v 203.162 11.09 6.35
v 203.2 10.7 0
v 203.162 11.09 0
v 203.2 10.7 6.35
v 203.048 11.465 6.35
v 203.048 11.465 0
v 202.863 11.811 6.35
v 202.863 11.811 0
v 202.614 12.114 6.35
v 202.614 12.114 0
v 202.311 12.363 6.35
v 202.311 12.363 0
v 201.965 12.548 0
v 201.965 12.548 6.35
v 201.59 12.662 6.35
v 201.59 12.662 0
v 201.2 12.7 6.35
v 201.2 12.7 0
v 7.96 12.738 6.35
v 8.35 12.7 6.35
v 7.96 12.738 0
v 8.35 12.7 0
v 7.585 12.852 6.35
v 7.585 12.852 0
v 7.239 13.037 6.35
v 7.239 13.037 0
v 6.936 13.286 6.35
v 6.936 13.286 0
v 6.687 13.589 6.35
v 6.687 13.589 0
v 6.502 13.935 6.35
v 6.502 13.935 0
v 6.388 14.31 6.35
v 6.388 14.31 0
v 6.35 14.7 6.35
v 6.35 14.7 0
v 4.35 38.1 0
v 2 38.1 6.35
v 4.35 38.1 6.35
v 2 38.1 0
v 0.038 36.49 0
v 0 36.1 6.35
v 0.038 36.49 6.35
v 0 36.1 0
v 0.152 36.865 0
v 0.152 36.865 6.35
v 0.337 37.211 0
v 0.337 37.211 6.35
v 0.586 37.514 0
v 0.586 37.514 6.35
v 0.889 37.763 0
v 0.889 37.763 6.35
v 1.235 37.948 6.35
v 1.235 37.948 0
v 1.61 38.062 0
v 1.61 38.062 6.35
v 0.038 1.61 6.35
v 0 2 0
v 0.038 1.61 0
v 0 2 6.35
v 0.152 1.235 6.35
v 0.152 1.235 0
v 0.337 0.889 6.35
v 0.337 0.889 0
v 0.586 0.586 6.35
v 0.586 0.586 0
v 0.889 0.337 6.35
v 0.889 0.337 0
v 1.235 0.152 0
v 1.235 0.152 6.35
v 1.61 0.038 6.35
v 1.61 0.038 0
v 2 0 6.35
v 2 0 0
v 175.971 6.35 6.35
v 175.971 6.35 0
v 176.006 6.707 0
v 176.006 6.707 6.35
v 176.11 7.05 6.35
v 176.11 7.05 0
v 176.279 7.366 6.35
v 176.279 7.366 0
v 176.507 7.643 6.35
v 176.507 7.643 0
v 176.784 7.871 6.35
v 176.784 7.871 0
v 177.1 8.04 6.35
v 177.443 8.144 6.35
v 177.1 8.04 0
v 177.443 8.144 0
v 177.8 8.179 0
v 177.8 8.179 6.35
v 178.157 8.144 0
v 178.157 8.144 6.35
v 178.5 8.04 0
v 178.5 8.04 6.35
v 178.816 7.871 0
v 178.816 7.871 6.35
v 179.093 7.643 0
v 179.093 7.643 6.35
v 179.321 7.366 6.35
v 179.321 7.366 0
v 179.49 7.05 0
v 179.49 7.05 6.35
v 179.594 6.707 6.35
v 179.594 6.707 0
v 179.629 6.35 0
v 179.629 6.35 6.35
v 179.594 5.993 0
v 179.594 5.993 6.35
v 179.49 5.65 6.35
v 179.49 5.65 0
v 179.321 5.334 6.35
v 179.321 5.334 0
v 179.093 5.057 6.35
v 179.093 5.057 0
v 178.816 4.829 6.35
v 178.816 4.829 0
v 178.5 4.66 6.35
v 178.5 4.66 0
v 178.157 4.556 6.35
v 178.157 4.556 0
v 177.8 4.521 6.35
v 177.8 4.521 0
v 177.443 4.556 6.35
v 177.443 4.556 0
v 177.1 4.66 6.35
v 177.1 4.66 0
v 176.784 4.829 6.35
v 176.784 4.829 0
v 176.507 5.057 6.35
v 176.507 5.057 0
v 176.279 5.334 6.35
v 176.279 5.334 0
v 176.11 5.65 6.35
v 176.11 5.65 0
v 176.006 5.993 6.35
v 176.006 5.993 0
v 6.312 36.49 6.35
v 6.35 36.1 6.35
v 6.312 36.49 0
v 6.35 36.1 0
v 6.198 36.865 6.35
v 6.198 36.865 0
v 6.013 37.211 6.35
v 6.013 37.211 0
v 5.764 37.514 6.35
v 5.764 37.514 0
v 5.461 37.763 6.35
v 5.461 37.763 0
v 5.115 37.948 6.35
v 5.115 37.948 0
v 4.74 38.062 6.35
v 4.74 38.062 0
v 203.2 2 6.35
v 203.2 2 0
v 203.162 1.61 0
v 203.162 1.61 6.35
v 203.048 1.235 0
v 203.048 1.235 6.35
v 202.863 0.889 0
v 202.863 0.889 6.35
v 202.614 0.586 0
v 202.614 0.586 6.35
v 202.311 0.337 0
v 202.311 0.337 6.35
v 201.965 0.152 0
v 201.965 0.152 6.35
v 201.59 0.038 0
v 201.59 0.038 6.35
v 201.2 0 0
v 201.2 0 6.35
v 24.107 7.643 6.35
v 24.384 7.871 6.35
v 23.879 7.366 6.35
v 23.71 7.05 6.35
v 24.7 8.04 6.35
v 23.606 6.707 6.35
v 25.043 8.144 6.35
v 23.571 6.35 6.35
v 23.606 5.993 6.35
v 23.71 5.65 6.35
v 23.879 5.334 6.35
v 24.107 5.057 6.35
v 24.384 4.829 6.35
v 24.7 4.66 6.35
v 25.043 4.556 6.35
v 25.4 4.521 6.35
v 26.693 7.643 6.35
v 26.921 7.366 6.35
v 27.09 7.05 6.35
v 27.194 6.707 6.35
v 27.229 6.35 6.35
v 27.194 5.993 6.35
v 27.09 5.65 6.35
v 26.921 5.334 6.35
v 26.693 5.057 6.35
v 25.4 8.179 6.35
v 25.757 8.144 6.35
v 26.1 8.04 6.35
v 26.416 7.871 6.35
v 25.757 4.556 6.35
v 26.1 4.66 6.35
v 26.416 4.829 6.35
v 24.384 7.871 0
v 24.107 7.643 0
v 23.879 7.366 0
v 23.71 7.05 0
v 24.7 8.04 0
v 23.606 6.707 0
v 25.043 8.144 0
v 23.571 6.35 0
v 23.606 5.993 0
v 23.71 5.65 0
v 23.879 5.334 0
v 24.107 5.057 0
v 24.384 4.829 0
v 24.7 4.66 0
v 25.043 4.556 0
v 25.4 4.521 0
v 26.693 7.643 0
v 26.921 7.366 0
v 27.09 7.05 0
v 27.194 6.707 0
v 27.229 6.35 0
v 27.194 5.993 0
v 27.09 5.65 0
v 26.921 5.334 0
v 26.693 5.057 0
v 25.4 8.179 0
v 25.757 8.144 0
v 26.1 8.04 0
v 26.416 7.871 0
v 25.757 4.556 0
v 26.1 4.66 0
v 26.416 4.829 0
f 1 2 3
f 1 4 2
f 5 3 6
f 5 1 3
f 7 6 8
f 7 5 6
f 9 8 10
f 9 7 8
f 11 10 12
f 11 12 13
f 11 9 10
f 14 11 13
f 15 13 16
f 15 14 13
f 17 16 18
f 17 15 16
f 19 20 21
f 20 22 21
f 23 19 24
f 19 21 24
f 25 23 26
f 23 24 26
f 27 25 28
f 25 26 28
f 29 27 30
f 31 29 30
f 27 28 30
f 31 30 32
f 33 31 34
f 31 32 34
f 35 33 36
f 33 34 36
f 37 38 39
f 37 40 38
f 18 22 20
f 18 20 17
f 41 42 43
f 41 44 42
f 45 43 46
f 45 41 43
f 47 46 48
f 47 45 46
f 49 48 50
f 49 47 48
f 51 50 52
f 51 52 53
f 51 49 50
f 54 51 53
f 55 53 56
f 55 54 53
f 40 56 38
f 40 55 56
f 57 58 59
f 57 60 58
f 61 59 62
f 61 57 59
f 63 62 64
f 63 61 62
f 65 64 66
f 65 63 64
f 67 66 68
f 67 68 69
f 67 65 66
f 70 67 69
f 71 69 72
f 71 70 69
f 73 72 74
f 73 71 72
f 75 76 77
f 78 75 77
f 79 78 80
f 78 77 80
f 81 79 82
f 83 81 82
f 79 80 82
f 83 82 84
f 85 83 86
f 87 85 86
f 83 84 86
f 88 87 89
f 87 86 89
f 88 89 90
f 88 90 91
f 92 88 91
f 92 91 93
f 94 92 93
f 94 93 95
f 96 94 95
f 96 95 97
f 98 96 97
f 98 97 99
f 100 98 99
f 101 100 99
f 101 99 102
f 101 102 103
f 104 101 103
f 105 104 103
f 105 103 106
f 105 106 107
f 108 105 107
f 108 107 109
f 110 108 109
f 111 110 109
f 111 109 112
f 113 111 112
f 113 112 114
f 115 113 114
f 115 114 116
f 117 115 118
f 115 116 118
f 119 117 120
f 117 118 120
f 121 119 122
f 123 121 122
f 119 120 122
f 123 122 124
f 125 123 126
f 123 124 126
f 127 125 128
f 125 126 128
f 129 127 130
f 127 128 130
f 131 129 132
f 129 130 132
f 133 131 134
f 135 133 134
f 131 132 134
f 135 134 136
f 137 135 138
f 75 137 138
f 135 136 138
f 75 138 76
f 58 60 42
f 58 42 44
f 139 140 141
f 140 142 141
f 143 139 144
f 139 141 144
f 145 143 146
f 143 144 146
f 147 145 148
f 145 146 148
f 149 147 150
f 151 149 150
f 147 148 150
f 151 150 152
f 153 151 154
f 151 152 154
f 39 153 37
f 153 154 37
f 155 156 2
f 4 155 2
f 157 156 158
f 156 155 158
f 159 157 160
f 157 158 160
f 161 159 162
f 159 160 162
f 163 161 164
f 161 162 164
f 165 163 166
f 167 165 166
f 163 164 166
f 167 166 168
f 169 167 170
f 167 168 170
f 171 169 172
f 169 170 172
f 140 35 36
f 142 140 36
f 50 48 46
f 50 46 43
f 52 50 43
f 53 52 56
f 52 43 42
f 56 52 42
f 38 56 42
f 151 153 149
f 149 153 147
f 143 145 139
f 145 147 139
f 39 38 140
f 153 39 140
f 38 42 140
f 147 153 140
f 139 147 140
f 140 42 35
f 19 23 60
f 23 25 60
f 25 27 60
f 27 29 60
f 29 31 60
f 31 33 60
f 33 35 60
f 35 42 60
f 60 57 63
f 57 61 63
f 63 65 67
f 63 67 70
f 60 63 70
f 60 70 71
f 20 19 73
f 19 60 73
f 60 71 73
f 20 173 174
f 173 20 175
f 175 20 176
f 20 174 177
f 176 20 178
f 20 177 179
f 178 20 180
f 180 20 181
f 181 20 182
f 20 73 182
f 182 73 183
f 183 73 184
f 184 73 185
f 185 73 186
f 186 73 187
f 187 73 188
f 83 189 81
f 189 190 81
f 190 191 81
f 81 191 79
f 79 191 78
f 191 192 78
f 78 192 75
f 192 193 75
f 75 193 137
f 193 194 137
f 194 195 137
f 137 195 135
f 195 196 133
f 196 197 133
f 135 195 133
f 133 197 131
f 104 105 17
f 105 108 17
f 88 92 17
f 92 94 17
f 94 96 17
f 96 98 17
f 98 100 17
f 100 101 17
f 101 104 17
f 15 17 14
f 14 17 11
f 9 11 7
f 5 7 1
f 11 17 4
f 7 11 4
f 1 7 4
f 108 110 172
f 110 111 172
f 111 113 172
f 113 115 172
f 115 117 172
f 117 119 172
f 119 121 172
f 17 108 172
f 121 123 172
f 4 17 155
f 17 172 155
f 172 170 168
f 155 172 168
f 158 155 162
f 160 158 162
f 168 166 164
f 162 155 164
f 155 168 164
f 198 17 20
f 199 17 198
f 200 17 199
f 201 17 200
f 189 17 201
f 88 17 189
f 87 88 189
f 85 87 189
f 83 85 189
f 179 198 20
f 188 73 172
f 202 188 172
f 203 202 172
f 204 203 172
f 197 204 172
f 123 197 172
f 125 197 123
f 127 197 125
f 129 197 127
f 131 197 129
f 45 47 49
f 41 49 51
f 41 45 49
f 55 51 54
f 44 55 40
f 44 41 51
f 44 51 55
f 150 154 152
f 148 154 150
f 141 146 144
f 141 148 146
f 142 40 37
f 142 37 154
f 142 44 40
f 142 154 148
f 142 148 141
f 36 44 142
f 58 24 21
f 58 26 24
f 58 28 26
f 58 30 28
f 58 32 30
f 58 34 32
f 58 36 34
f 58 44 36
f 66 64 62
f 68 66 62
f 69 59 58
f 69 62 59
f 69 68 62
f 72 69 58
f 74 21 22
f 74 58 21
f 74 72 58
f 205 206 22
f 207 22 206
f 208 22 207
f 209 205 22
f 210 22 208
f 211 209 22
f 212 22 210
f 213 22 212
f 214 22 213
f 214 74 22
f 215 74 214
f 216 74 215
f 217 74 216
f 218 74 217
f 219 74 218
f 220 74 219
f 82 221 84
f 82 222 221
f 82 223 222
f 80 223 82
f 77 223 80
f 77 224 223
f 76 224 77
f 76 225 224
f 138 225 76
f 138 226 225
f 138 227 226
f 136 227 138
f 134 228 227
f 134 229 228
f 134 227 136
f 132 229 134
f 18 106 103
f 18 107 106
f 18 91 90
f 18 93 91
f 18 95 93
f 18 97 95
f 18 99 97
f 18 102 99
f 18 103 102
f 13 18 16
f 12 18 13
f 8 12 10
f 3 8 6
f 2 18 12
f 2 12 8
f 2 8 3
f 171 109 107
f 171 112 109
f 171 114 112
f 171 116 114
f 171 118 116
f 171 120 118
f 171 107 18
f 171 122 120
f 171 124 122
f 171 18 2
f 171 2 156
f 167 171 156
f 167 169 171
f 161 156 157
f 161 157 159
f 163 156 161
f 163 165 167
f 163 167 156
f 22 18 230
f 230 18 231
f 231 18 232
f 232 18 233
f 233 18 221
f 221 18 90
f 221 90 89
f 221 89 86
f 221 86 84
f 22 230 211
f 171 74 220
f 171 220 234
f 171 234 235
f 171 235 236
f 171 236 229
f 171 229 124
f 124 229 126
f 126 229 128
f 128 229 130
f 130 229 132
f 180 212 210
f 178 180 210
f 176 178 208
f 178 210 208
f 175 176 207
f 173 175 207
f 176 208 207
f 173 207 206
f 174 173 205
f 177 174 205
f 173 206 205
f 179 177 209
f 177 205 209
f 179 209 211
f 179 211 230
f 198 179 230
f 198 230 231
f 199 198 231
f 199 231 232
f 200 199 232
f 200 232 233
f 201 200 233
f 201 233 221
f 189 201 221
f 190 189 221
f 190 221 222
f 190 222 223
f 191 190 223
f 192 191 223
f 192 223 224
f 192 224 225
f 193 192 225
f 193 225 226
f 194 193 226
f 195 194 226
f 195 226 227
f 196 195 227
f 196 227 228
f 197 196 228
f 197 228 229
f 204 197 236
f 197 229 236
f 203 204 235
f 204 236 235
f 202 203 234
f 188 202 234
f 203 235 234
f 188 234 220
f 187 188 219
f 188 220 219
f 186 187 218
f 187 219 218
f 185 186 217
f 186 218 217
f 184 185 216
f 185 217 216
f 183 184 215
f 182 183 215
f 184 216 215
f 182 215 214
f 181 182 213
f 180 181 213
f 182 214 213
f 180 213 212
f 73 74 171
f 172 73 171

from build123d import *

# Parameters (mm, degrees)
SKETCH2_W                 = 203.2
SKETCH2_H                 = 12.7
BOSS_EXTRUDE1_DEPTH       = 6.35
SKETCH3_W                 = 6.35
SKETCH3_H                 = 6.35
BOSS_EXTRUDE2_DEPTH       = 25.4
FILLET2_R                 = 2
F_6_CLEARANCE_HOLE1_D     = 3.6576
F_6_CLEARANCE_HOLE1_DEPTH = 10.16
F_6_CLEARANCE_HOLE1_TIP   = 1.0988539


with BuildPart() as part:
    # Sketch2 → Boss-Extrude1 (new body)
    with BuildSketch(Plane.XY):
        with Locations((101.6, 6.35)):
            Rectangle(SKETCH2_W, SKETCH2_H)
    extrude(amount=BOSS_EXTRUDE1_DEPTH)

    # Sketch3 → Boss-Extrude2 (add)
    with BuildSketch(Plane(origin=(0, 12.7, 0), x_dir=(1, 0, 0), z_dir=(0, 1, 0))):
        with Locations((3.175, -3.175)):
            Rectangle(SKETCH3_W, SKETCH3_H)
    extrude(amount=BOSS_EXTRUDE2_DEPTH)

    # Fillet2
    fillet2_edges = [part.edges().sort_by_distance(p)[0] for p in [
        (6.35, 12.7, 3.175),
        (0, 38.1, 3.175),
        (6.35, 38.1, 3.175),
        (203.2, 12.7, 3.175),
        (203.2, 0, 3.175),
        (0, 0, 3.175),
    ]]
    fillet(fillet2_edges, radius=FILLET2_R)

    # #6 Clearance Hole1
    with Locations(Plane.XY.offset(6.35)):
        with Locations((177.8, 6.35), (25.4, 6.35)):
            Hole(F_6_CLEARANCE_HOLE1_D / 2, depth=F_6_CLEARANCE_HOLE1_DEPTH)
            with Locations((0, 0, -(F_6_CLEARANCE_HOLE1_DEPTH + F_6_CLEARANCE_HOLE1_TIP / 2))):  # 118° drill point
                Cone(0, F_6_CLEARANCE_HOLE1_D / 2, F_6_CLEARANCE_HOLE1_TIP, mode=Mode.SUBTRACT)


solid = part.part
